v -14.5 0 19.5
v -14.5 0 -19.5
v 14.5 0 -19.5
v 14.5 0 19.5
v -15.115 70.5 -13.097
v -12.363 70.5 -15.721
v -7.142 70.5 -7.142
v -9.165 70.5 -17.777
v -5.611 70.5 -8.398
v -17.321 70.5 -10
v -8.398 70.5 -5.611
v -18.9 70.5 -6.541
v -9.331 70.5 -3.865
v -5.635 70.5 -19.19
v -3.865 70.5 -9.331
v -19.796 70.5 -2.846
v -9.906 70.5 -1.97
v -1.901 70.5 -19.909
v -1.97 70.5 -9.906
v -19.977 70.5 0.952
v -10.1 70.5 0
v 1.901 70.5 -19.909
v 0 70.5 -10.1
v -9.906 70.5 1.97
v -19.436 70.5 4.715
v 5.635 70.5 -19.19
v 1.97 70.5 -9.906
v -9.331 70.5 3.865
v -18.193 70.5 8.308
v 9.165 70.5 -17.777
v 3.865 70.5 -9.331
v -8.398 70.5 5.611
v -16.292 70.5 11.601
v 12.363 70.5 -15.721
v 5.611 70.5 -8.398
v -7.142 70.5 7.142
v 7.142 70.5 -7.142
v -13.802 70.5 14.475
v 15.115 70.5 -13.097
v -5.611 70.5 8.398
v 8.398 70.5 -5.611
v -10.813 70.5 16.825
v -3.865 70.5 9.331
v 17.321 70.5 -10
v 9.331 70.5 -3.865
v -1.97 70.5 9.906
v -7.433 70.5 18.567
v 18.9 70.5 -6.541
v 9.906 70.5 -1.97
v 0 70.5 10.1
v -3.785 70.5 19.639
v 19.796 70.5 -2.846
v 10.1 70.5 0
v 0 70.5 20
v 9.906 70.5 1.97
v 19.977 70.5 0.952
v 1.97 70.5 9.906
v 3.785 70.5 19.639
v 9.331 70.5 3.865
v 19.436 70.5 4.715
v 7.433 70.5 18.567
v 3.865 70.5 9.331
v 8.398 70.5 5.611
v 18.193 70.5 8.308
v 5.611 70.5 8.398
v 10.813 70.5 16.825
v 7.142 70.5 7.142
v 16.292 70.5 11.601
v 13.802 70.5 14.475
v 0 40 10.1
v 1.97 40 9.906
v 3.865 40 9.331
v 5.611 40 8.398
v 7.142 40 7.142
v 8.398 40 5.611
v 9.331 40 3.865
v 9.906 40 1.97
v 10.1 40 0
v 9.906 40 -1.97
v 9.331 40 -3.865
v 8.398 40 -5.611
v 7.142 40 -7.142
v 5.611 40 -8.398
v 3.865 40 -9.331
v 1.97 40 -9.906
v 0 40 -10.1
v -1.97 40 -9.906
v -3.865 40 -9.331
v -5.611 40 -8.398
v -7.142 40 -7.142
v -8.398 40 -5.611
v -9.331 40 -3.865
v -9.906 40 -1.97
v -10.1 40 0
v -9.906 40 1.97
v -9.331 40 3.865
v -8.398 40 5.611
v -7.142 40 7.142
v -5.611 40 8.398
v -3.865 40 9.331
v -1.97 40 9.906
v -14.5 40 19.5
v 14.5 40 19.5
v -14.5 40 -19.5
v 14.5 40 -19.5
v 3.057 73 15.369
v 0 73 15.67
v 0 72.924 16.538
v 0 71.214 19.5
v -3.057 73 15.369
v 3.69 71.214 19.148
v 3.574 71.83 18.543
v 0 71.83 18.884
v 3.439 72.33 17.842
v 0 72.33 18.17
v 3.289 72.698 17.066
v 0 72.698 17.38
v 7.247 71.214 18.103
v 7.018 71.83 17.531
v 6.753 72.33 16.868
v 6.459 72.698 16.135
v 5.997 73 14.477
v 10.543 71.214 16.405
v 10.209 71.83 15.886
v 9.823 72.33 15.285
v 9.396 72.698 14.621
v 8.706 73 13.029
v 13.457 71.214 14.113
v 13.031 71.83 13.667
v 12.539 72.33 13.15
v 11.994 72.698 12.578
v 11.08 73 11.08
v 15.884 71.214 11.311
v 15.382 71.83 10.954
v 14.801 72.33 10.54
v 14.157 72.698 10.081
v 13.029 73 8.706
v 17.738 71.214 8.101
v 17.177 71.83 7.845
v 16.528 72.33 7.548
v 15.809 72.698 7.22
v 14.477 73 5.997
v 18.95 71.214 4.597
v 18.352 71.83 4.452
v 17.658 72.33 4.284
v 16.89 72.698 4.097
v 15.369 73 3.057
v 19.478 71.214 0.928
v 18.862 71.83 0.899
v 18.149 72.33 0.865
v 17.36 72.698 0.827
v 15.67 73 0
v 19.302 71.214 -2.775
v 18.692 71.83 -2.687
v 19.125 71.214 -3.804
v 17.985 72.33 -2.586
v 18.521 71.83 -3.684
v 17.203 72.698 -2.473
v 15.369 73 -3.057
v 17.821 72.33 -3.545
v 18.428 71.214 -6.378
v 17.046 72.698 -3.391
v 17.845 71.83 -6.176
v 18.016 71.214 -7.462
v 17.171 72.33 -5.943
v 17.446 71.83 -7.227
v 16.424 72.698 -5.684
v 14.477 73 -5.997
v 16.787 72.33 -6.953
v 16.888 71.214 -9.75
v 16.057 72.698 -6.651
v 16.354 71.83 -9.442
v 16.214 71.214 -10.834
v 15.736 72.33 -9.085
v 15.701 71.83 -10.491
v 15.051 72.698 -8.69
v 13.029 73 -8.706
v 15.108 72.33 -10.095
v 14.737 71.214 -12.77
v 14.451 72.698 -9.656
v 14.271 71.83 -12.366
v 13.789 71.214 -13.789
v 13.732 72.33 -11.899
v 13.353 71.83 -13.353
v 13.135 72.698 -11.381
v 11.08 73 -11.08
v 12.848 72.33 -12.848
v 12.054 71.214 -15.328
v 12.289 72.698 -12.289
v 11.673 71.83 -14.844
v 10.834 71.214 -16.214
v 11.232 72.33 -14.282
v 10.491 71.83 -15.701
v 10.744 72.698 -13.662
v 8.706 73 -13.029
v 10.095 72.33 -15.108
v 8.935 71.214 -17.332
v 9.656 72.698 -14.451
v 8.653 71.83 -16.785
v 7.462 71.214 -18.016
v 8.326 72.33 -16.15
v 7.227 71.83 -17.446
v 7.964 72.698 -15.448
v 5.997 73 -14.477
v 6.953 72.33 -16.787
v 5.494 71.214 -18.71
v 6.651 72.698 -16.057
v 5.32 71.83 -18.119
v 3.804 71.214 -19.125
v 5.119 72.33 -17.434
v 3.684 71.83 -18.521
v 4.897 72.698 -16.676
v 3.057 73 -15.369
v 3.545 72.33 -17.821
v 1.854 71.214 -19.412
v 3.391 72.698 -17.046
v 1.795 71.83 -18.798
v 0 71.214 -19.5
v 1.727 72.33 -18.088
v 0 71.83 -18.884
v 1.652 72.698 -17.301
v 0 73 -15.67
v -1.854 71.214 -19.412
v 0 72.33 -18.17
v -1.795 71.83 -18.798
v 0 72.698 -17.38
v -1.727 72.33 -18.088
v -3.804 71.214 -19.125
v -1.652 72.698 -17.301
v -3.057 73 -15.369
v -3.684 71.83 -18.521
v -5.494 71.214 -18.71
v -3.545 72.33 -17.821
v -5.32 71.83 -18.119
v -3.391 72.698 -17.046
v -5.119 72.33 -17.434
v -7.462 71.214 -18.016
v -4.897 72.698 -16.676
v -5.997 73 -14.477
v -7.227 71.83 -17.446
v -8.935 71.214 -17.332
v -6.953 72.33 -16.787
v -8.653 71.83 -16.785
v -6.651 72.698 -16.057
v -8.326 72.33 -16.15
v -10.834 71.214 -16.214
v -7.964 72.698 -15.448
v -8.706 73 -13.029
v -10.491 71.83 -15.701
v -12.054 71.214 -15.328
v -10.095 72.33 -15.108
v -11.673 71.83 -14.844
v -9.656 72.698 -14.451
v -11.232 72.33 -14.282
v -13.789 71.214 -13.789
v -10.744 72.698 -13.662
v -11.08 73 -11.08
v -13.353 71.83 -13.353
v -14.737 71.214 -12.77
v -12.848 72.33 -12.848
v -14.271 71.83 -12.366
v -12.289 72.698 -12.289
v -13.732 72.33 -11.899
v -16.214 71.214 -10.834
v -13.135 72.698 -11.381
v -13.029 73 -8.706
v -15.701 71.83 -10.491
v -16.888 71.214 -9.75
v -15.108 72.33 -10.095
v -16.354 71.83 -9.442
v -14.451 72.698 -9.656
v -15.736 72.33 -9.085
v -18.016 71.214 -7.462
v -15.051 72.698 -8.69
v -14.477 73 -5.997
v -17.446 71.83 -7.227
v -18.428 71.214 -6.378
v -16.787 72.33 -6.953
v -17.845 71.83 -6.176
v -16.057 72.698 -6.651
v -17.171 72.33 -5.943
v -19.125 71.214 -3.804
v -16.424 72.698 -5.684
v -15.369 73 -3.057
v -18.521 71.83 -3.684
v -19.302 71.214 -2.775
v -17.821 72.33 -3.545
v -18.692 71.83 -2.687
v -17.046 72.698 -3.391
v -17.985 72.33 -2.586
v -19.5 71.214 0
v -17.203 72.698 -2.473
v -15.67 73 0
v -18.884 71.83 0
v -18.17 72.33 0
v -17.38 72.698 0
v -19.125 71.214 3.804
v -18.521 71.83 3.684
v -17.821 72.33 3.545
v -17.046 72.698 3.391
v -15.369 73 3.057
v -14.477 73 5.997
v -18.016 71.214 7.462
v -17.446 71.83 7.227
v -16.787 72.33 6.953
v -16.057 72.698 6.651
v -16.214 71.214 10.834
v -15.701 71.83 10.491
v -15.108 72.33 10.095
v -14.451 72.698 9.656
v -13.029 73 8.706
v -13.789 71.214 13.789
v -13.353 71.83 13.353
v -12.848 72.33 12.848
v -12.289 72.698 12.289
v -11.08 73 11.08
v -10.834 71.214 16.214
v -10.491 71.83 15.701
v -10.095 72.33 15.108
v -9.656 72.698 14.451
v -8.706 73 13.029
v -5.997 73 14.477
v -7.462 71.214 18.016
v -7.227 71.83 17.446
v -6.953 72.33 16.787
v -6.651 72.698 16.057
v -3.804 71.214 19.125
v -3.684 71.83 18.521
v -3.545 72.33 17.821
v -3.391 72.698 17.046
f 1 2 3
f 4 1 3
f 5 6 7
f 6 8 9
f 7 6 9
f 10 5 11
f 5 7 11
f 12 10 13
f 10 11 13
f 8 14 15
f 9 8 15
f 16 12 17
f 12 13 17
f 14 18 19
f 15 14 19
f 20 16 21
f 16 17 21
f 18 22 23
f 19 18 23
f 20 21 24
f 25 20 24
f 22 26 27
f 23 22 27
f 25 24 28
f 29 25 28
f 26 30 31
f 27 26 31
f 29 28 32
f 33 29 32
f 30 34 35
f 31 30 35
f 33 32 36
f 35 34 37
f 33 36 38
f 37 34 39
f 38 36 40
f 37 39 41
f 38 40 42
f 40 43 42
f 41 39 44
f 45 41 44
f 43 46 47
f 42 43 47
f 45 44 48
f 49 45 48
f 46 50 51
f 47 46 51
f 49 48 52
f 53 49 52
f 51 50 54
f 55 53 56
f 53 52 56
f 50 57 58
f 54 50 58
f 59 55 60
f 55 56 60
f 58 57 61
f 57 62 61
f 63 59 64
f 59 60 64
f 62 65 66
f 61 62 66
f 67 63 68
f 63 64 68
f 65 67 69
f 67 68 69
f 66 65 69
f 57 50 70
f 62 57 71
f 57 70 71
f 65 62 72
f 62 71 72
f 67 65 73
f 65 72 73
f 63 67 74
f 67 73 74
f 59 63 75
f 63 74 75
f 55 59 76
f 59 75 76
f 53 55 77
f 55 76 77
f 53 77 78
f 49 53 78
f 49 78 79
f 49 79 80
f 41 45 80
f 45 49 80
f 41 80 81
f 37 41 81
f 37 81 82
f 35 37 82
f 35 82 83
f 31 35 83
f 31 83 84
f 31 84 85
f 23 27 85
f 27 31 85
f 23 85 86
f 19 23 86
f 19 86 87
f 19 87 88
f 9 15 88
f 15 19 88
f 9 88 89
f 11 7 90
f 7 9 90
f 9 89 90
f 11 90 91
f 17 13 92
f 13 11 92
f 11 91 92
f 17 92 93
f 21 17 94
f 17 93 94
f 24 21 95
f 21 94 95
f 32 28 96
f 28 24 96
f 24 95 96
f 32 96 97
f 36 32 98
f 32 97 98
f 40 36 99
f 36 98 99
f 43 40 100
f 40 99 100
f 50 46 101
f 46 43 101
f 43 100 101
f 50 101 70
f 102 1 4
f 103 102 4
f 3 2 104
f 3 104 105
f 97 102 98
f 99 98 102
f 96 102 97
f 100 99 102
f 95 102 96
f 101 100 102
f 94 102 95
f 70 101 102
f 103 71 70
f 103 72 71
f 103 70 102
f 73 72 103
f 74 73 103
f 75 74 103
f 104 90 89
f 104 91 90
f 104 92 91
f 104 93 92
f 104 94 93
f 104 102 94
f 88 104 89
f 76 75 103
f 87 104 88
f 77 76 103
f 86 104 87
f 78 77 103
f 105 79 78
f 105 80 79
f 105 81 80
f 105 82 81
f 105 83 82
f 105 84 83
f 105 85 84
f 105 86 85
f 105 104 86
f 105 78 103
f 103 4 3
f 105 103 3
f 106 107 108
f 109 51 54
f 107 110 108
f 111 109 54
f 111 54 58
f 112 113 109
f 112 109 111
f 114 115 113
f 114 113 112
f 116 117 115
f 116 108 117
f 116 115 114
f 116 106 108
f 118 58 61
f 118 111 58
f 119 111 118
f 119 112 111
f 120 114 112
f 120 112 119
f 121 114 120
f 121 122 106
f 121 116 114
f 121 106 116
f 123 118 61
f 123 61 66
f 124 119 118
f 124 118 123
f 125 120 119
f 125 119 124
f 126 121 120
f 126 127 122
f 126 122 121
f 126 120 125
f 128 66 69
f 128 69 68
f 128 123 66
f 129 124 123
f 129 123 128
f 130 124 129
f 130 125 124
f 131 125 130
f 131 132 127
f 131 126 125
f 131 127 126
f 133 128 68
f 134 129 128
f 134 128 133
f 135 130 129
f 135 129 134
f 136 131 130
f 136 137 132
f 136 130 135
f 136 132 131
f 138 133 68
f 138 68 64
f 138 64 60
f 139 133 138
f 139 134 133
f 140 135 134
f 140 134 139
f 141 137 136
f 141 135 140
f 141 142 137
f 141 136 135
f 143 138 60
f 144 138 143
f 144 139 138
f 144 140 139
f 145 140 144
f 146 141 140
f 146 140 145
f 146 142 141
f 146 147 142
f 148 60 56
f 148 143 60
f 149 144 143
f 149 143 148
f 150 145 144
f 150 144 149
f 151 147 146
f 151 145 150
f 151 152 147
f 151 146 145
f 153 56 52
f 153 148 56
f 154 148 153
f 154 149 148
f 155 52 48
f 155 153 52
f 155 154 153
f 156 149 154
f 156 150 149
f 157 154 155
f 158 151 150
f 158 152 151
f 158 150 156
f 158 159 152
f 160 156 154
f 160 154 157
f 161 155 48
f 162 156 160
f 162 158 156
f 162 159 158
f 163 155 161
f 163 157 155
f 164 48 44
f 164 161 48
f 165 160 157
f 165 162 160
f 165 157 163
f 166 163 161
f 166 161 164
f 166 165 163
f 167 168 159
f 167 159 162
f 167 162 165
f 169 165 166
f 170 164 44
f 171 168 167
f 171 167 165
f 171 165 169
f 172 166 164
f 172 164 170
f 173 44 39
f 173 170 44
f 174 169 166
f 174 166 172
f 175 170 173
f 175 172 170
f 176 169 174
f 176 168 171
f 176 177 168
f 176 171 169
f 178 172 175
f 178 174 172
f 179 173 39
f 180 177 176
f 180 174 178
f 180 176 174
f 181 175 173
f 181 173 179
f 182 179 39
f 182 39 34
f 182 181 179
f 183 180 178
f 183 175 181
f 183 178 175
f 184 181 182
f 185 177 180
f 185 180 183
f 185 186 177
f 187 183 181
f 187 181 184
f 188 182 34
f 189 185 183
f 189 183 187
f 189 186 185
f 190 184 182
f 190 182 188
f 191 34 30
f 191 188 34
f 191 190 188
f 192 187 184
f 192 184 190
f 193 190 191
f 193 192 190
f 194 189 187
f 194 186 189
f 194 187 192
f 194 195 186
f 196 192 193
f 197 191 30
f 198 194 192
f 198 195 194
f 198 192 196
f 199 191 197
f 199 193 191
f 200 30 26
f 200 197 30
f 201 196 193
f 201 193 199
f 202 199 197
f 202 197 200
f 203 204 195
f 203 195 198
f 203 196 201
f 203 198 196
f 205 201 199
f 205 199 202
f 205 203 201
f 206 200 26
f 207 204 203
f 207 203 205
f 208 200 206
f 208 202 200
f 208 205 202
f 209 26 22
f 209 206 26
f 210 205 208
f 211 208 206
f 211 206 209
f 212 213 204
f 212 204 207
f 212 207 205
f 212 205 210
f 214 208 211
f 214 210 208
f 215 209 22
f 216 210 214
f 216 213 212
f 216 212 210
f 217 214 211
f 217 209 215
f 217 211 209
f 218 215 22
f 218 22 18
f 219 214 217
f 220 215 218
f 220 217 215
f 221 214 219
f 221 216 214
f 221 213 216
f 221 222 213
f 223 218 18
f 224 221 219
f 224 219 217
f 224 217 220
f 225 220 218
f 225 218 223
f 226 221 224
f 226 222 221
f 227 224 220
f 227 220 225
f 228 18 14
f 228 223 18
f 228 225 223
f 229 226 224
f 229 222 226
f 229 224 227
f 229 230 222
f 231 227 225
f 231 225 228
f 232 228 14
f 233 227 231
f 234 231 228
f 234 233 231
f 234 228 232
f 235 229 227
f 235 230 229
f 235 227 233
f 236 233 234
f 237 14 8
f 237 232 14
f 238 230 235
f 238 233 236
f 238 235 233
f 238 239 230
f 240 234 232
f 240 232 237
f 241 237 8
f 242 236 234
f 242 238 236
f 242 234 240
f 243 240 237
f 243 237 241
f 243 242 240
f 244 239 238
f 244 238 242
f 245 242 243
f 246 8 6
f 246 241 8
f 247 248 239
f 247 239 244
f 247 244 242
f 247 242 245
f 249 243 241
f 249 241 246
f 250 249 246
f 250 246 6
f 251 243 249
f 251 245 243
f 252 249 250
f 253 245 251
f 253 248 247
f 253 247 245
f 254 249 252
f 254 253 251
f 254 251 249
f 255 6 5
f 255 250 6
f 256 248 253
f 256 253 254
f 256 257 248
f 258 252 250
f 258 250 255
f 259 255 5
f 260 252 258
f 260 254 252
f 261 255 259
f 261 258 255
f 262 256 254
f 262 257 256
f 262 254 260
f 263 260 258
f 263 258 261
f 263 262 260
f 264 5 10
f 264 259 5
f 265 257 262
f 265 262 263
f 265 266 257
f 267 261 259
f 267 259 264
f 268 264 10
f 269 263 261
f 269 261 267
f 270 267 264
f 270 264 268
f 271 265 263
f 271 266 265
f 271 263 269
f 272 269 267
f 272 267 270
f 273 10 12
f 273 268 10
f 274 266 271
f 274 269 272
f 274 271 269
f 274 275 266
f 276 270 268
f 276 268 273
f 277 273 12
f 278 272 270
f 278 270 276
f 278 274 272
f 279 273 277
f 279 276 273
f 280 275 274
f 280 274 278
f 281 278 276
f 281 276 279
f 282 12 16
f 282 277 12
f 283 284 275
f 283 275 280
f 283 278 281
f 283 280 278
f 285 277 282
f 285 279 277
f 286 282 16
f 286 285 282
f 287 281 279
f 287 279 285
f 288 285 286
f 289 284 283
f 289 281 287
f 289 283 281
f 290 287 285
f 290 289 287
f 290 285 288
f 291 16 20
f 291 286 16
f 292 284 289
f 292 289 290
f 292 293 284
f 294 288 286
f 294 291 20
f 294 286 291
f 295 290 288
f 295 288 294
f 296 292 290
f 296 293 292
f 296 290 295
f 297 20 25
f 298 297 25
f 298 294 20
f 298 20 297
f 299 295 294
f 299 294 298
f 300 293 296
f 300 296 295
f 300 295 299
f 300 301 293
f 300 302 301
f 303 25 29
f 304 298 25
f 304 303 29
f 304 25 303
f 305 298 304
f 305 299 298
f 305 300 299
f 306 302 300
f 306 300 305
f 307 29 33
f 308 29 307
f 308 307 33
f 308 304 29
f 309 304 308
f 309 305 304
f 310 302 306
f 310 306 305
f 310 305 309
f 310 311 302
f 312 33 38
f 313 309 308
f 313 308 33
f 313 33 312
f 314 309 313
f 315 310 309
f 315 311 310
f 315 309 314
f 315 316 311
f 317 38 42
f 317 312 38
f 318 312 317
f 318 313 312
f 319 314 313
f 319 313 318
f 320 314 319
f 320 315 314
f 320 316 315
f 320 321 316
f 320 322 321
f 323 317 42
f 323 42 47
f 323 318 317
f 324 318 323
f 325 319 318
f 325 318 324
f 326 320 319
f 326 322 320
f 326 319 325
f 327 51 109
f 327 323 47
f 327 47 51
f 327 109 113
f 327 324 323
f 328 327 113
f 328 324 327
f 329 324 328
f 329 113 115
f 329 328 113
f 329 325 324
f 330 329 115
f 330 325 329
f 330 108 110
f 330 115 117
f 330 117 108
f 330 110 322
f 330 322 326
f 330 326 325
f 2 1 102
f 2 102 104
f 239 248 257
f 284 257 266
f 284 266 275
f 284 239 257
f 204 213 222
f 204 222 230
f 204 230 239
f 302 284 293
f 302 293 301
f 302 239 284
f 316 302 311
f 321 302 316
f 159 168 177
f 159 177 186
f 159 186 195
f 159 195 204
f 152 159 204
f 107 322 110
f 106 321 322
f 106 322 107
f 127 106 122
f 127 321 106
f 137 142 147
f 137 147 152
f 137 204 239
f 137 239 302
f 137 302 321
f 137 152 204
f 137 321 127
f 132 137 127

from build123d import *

# Parameters (mm, degrees)
SKETCH1_W           = 29
SKETCH1_H           = 39
BOSS_EXTRUDE1_DEPTH = 40
SKETCH2_R           = 10.1
BOSS_EXTRUDE2_DEPTH = 33
SKETCH3_R           = 20
BOSS_EXTRUDE3_DEPTH = 2.5
FILLET1_R           = 5


with BuildPart() as part:
    # Sketch1 → Boss-Extrude1 (new body)
    with BuildSketch(Plane(origin=(0, 0, 0), x_dir=(1, 0, 0), z_dir=(0, 1, 0))):
        Rectangle(SKETCH1_W, SKETCH1_H)
    extrude(amount=BOSS_EXTRUDE1_DEPTH)

    # Sketch2 → Boss-Extrude2 (add)
    with BuildSketch(Plane(origin=(0, 40, 0), x_dir=(1, 0, 0), z_dir=(0, 1, 0))):
        with Locations(Location((0, 0, 0), (0, 0, 270))):
            Circle(SKETCH2_R)
    extrude(amount=BOSS_EXTRUDE2_DEPTH)

    # Sketch3 → Boss-Extrude3 (add)
    with BuildSketch(Plane(origin=(0, 73, 0), x_dir=(1, 0, 0), z_dir=(0, 1, 0))):
        with Locations(Location((0, 0, 0), (0, 0, 270))):
            Circle(SKETCH3_R)
    extrude(amount=-BOSS_EXTRUDE3_DEPTH)

    # Fillet1
    # the kernel refuses this fillet: 5 mm, written as the material it takes off along each edge
    with BuildSketch(Plane(origin=(0, 73, 0), x_dir=(0, 0, 1), z_dir=(-1, 0, 0))) as fillet1_piece_1:
        with BuildLine():
            CenterArc((15.669872981, -5), FILLET1_R, 30, 60)
            Line((15.669872981, 0), (15.669872981, 0.1))
            Line((15.669872981, 0.1), (20, 0.1))
            Line((20, 0.1), (20.1, 0))
            ThreePointArc((20.1, 0), (20.1, -1.25), (20.08660254, -2.45))
            Line((20.08660254, -2.45), (20, -2.5))
        make_face()
    revolve(axis=Axis((0, 73, 0), (0, 1, 0)), mode=Mode.SUBTRACT)


solid = part.part
